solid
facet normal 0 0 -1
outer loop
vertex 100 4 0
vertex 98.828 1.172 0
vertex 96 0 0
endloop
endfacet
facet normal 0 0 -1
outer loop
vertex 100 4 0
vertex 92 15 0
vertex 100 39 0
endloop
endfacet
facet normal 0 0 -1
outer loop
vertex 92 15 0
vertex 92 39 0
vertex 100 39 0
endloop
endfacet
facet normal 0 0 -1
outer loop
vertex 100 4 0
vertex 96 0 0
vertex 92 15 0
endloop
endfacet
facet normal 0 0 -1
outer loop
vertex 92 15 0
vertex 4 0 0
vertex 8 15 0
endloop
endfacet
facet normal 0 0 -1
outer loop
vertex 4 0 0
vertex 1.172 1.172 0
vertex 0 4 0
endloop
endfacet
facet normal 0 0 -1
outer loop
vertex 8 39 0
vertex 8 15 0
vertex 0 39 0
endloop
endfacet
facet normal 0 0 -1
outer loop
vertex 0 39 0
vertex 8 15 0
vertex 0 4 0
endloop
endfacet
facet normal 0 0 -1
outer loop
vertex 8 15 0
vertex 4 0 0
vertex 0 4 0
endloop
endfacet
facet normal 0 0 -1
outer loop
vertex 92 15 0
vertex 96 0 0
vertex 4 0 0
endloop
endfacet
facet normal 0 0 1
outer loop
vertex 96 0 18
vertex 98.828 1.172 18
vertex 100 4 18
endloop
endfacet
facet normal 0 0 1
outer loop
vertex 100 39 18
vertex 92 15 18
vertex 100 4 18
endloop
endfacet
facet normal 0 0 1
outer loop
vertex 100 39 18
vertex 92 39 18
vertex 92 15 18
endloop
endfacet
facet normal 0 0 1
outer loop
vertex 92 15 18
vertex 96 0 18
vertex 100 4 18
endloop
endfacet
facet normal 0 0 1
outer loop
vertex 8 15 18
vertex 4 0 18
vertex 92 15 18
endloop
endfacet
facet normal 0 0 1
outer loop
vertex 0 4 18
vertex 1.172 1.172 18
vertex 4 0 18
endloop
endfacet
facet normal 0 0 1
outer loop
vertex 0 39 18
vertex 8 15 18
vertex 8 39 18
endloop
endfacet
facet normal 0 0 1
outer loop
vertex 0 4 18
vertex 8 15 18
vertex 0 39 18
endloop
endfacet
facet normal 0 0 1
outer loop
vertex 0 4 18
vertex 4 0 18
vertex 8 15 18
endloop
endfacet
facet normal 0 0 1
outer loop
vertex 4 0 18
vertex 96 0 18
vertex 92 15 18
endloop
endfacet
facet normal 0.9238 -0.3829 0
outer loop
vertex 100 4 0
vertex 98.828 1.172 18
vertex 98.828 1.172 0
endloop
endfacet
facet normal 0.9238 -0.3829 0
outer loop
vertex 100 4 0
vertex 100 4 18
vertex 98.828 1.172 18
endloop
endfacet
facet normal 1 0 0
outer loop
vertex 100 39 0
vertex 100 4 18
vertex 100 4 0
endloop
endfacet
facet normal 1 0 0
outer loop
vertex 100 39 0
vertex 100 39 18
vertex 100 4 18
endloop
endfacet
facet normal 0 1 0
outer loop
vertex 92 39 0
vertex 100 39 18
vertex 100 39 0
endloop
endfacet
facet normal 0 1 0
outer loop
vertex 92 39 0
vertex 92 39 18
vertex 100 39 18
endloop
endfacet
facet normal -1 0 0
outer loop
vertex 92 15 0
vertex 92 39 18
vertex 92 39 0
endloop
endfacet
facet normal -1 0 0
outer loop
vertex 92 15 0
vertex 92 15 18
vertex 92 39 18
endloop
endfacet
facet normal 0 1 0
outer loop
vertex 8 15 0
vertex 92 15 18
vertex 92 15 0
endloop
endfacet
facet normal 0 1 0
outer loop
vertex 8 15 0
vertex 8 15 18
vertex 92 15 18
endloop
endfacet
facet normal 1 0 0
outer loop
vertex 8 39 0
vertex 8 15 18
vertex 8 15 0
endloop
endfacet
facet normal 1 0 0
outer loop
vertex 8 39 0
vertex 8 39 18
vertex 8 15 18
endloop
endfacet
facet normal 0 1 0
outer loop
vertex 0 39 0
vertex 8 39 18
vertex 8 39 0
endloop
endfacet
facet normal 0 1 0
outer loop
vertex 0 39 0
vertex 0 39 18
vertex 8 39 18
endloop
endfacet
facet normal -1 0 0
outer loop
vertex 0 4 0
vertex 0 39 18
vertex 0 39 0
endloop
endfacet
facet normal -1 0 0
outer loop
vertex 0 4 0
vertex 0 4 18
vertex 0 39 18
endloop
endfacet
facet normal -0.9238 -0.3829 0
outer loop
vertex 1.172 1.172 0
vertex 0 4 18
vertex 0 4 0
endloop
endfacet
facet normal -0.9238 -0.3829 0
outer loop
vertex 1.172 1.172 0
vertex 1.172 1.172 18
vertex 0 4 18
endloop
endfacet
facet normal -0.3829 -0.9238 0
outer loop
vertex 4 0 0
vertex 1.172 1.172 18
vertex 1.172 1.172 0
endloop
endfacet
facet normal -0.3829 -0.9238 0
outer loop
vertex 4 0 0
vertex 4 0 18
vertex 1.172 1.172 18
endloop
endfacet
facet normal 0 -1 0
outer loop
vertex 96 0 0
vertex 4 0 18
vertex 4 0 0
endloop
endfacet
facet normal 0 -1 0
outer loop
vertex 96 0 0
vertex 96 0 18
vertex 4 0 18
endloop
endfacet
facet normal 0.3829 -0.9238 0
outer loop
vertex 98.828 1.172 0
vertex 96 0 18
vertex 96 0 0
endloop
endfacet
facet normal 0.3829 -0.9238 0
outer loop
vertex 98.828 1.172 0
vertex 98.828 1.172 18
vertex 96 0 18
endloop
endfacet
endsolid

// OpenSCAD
$fn = 32;

// ----------------------------------------------------------------------
// Heat sink frame: 100 x 39 mm frame, 8 mm walls
// ----------------------------------------------------------------------

// --- parameters (mm) ---
profile_height = 18;      // extrusion height
profile_points = 12;      // points of the closed outline

profile = [[0, 4], [1.172, 1.172], [4, 0], [96, 0], [98.828, 1.172], [100, 4], [100, 39], [92, 39], [92, 15], [8, 15], [8, 39], [0, 39]];  // single closed polygon, 12 points, counter clockwise

// --- the one profile operation ---
linear_extrude(height = profile_height) polygon(points = profile);
